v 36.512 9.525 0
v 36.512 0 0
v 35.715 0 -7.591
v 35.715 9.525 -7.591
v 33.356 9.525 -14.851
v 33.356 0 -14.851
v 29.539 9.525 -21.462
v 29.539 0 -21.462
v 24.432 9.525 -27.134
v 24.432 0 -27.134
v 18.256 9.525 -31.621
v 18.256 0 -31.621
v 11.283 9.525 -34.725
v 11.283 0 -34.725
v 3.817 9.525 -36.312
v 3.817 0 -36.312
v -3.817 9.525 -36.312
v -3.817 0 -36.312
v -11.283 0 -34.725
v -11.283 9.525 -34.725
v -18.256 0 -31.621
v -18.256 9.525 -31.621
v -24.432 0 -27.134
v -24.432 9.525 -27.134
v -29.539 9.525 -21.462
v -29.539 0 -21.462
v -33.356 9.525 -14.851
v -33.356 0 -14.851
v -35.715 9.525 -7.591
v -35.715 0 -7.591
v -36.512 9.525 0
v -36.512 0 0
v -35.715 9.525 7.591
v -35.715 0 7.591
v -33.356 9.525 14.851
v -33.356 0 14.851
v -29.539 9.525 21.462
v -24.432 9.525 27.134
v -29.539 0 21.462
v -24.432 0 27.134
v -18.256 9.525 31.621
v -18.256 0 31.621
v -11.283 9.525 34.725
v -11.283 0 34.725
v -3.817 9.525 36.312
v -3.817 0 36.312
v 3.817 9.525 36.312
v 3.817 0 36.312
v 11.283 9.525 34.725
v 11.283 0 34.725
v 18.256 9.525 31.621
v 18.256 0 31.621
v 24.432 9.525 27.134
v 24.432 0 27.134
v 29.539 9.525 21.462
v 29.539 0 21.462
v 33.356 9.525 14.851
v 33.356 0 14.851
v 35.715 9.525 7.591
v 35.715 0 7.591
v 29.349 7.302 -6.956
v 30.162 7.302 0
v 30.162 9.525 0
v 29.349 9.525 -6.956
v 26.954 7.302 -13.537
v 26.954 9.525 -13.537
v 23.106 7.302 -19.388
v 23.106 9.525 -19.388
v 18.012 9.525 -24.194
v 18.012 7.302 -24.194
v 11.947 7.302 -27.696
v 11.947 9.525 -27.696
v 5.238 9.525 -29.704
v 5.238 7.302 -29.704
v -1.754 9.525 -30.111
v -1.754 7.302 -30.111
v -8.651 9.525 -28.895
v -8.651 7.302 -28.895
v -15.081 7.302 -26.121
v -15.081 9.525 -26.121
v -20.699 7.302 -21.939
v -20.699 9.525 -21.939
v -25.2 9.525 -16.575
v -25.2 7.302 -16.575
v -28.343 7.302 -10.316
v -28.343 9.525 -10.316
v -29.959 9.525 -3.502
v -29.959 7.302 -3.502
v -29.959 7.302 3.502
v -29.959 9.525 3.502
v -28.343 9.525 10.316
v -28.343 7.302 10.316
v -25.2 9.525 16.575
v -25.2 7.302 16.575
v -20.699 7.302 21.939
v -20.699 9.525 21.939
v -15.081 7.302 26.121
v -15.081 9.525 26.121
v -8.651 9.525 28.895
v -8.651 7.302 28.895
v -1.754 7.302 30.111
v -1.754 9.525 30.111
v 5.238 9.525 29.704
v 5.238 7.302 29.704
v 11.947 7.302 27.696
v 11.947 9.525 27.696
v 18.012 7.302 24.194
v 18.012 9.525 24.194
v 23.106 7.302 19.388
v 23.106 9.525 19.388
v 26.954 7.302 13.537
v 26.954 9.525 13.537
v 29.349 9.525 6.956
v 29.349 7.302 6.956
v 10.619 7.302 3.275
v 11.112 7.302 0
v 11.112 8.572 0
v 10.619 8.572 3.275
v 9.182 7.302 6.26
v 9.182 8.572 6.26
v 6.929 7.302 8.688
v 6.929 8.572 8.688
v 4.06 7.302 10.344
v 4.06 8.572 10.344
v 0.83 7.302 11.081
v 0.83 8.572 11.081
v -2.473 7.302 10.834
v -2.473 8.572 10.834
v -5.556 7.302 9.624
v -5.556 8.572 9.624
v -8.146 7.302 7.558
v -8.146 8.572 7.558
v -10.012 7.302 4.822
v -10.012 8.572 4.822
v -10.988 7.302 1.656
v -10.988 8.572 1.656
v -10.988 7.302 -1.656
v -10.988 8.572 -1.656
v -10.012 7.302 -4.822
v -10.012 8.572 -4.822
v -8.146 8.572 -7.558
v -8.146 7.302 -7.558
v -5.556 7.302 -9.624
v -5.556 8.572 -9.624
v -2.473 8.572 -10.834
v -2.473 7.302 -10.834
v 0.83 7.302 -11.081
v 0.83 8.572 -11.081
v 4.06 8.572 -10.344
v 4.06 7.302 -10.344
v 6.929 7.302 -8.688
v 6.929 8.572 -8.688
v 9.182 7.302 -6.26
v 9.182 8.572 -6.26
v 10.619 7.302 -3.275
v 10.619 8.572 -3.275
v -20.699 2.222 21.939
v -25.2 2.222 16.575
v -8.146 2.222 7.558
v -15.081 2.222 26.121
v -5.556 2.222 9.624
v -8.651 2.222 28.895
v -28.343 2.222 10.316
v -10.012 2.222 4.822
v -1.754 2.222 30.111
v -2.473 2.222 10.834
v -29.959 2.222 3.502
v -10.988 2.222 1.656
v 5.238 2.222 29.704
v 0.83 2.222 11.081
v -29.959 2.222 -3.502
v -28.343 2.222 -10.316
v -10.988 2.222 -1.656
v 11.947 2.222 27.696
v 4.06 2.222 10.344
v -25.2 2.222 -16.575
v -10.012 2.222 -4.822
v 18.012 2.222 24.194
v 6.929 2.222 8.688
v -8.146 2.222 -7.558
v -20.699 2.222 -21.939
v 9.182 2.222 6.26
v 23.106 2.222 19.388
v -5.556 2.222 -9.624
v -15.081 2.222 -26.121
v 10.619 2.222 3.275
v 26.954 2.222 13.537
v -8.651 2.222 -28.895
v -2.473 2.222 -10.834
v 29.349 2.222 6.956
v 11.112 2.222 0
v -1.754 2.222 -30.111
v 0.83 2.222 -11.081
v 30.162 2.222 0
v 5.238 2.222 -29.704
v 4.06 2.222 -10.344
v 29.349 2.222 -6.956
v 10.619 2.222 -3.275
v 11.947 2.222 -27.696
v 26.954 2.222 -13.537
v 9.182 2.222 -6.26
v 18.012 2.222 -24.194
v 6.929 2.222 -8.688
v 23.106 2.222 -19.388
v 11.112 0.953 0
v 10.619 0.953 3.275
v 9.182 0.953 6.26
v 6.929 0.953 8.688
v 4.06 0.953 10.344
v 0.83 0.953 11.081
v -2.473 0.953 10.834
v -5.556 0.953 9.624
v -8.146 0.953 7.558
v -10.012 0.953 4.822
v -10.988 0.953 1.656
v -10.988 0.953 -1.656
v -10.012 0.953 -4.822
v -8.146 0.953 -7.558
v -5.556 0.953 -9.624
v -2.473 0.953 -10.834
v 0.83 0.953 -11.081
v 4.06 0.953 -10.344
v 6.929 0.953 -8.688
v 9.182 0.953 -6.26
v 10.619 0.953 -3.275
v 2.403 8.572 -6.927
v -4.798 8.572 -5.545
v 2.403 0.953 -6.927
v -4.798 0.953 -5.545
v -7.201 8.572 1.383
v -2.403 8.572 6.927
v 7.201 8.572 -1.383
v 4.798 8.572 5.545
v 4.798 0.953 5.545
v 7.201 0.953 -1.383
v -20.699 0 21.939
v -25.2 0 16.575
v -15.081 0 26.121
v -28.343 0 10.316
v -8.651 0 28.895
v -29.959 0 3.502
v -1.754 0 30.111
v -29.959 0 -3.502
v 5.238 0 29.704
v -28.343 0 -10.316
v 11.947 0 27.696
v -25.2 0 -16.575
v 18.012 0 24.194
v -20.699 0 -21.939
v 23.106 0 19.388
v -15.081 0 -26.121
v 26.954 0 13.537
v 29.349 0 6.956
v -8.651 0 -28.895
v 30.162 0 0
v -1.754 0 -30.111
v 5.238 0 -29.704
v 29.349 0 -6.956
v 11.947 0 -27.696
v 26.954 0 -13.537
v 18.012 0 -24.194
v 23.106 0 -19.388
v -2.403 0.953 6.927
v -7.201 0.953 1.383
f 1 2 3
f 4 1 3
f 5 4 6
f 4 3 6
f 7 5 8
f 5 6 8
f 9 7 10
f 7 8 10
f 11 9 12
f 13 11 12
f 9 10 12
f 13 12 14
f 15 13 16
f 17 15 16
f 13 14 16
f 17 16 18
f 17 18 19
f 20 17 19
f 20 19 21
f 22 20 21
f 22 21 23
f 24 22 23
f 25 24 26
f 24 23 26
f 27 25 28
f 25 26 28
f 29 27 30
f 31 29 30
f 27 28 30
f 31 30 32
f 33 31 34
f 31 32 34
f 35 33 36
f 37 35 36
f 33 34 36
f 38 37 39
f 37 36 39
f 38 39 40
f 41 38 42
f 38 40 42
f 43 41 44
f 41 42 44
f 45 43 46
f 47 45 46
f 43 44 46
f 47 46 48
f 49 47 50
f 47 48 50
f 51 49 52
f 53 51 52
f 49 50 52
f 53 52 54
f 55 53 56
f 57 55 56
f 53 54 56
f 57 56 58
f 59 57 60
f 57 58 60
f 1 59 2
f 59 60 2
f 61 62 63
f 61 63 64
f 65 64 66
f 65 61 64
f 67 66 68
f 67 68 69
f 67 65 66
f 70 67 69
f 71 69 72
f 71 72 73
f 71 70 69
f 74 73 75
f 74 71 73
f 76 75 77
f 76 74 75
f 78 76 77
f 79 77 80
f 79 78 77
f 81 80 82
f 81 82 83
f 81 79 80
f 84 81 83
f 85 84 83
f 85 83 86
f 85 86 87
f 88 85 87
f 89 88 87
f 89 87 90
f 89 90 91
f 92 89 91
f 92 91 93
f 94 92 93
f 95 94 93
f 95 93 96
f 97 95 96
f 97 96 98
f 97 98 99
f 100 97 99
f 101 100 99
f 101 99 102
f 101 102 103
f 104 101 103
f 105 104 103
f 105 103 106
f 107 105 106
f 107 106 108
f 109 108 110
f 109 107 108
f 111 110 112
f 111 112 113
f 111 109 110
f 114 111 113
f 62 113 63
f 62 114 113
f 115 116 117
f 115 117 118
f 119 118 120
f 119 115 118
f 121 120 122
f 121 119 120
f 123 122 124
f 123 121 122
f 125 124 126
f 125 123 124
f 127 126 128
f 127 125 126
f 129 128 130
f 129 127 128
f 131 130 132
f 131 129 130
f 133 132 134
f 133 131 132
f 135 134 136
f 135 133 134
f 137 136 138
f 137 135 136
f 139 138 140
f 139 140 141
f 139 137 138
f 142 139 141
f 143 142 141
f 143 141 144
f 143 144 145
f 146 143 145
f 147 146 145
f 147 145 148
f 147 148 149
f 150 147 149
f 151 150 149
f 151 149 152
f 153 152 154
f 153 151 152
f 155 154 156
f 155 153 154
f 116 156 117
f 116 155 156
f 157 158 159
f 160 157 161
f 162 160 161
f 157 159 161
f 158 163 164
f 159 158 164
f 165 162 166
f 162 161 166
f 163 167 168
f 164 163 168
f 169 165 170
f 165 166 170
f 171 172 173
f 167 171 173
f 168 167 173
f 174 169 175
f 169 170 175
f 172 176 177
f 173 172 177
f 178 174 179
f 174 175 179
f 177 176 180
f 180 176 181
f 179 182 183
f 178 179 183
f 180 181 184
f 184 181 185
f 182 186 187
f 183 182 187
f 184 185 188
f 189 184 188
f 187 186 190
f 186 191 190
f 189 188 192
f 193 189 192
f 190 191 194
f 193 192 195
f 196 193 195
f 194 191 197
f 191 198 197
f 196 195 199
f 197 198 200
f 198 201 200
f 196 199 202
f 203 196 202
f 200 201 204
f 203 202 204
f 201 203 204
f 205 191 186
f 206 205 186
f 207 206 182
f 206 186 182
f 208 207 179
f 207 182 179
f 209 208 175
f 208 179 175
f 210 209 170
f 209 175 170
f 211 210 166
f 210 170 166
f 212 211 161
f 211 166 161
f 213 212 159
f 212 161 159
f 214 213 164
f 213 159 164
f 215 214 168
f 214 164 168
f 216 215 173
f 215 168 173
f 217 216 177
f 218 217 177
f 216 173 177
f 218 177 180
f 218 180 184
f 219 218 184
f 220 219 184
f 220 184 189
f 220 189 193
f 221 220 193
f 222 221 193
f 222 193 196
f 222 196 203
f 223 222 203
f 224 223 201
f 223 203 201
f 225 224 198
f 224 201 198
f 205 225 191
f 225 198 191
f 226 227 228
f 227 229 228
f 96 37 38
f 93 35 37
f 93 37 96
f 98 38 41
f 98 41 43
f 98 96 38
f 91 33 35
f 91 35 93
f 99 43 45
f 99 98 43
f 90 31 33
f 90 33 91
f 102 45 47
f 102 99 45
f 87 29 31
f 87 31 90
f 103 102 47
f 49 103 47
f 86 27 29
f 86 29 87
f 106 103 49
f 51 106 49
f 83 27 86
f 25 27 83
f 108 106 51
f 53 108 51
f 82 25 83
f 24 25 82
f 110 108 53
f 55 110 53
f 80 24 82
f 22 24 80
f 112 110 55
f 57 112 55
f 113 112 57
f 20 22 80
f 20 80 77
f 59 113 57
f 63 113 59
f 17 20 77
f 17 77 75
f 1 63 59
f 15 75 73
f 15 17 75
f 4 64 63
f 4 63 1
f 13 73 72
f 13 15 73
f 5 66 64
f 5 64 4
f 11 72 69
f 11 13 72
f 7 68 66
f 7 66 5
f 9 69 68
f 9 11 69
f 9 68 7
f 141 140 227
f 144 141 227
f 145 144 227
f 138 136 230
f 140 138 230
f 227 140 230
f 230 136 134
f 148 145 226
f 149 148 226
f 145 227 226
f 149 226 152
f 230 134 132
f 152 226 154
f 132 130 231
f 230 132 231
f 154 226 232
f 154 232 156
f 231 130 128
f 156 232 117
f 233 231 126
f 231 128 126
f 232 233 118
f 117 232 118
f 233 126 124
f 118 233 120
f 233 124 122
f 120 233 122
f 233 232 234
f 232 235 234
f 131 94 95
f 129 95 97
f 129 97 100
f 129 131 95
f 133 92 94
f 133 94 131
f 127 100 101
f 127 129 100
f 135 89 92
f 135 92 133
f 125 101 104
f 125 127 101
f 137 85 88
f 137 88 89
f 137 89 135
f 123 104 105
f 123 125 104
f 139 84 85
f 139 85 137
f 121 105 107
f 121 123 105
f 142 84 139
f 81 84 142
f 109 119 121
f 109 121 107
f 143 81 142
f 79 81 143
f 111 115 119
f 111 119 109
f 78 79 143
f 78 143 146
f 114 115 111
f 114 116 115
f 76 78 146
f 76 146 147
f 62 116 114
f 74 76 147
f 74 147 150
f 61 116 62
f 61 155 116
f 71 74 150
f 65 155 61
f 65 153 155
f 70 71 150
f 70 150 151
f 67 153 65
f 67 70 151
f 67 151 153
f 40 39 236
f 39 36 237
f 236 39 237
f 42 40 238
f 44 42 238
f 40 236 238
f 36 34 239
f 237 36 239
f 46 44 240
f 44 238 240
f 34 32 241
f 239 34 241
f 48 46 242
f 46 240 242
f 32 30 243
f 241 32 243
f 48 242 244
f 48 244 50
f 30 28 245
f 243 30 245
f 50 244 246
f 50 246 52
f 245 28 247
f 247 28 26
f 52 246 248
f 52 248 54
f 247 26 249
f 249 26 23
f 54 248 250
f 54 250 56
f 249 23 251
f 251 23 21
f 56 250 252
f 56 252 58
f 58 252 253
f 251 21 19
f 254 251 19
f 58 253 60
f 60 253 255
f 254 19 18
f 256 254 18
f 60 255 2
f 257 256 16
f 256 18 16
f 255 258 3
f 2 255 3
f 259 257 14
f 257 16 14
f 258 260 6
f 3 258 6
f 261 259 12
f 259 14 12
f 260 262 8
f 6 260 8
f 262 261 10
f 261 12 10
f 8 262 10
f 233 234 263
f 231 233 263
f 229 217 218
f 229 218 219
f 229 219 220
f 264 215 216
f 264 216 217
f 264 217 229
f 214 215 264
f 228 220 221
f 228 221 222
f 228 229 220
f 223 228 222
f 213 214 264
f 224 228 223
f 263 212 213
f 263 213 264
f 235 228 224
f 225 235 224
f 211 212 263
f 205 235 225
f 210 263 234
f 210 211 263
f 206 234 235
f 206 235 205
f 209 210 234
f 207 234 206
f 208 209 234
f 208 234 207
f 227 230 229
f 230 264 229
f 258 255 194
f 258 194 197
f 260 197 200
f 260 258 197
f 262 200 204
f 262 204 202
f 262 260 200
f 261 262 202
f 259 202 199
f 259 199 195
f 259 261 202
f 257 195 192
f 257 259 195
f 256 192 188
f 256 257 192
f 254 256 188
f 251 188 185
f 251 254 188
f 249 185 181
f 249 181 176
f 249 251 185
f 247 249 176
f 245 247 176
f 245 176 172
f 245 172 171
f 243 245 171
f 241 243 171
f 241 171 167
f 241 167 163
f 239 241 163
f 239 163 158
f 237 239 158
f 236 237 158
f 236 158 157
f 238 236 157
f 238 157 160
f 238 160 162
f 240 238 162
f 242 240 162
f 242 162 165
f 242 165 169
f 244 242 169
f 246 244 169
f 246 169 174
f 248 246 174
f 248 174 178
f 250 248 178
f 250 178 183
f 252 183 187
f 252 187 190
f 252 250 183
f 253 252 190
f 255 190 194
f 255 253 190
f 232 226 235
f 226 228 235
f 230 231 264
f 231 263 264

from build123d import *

# Parameters (mm, degrees)
SKETCH1_R            = 36.5125
SKETCH1_R_2          = 30.1625
RIM_DEPTH            = 9.525
INNER_HUB_DEPTH      = 2.54
INNER_HUB_DEPTH_BACK = 2.54
SKETCH2_R            = 30.1625
SKETCH3_R            = 11.1125
HEX_STEP_DEPTH       = 1.27


with BuildPart() as part:
    # Sketch1 → Rim (new body)
    with BuildSketch(Plane(origin=(0, 0, 0), x_dir=(1, 0, 0), z_dir=(0, 1, 0))):
        Circle(SKETCH1_R)
        Circle(SKETCH1_R_2, mode=Mode.SUBTRACT)
    extrude(amount=RIM_DEPTH)

    # Sketch2 → Inner_Hub (add, two sides: drawn at the far end of the back side and taken through both)
    with BuildSketch(Plane(origin=(0, 4.7625, 0), x_dir=(1, 0, 0), z_dir=(0, 1, 0)).offset(-INNER_HUB_DEPTH_BACK)):
        Circle(SKETCH2_R)
        Polygon((7.200760698, 1.382887815), (2.402764371, 6.927485598), (-4.797996327, 5.544597783), (-7.200760698, -1.382887815), (-2.402764371, -6.927485598), (4.797996327, -5.544597783), align=None, mode=Mode.SUBTRACT)
    extrude(amount=INNER_HUB_DEPTH + INNER_HUB_DEPTH_BACK)

    # Sketch3 → Hex_Step (add)
    with BuildSketch(Plane.XZ.offset(-2.2225)):
        Circle(SKETCH3_R)
        Polygon((4.797996327, 5.544597783), (-2.402764371, 6.927485598), (-7.200760698, 1.382887815), (-4.797996327, -5.544597783), (2.402764371, -6.927485598), (7.200760698, -1.382887815), align=None, mode=Mode.SUBTRACT)
    hex_step = extrude(amount=HEX_STEP_DEPTH)

    # Mirror1: Hex_Step across plane
    add(hex_step.mirror(Plane.ZX.offset(4.7625)))


solid = part.part
